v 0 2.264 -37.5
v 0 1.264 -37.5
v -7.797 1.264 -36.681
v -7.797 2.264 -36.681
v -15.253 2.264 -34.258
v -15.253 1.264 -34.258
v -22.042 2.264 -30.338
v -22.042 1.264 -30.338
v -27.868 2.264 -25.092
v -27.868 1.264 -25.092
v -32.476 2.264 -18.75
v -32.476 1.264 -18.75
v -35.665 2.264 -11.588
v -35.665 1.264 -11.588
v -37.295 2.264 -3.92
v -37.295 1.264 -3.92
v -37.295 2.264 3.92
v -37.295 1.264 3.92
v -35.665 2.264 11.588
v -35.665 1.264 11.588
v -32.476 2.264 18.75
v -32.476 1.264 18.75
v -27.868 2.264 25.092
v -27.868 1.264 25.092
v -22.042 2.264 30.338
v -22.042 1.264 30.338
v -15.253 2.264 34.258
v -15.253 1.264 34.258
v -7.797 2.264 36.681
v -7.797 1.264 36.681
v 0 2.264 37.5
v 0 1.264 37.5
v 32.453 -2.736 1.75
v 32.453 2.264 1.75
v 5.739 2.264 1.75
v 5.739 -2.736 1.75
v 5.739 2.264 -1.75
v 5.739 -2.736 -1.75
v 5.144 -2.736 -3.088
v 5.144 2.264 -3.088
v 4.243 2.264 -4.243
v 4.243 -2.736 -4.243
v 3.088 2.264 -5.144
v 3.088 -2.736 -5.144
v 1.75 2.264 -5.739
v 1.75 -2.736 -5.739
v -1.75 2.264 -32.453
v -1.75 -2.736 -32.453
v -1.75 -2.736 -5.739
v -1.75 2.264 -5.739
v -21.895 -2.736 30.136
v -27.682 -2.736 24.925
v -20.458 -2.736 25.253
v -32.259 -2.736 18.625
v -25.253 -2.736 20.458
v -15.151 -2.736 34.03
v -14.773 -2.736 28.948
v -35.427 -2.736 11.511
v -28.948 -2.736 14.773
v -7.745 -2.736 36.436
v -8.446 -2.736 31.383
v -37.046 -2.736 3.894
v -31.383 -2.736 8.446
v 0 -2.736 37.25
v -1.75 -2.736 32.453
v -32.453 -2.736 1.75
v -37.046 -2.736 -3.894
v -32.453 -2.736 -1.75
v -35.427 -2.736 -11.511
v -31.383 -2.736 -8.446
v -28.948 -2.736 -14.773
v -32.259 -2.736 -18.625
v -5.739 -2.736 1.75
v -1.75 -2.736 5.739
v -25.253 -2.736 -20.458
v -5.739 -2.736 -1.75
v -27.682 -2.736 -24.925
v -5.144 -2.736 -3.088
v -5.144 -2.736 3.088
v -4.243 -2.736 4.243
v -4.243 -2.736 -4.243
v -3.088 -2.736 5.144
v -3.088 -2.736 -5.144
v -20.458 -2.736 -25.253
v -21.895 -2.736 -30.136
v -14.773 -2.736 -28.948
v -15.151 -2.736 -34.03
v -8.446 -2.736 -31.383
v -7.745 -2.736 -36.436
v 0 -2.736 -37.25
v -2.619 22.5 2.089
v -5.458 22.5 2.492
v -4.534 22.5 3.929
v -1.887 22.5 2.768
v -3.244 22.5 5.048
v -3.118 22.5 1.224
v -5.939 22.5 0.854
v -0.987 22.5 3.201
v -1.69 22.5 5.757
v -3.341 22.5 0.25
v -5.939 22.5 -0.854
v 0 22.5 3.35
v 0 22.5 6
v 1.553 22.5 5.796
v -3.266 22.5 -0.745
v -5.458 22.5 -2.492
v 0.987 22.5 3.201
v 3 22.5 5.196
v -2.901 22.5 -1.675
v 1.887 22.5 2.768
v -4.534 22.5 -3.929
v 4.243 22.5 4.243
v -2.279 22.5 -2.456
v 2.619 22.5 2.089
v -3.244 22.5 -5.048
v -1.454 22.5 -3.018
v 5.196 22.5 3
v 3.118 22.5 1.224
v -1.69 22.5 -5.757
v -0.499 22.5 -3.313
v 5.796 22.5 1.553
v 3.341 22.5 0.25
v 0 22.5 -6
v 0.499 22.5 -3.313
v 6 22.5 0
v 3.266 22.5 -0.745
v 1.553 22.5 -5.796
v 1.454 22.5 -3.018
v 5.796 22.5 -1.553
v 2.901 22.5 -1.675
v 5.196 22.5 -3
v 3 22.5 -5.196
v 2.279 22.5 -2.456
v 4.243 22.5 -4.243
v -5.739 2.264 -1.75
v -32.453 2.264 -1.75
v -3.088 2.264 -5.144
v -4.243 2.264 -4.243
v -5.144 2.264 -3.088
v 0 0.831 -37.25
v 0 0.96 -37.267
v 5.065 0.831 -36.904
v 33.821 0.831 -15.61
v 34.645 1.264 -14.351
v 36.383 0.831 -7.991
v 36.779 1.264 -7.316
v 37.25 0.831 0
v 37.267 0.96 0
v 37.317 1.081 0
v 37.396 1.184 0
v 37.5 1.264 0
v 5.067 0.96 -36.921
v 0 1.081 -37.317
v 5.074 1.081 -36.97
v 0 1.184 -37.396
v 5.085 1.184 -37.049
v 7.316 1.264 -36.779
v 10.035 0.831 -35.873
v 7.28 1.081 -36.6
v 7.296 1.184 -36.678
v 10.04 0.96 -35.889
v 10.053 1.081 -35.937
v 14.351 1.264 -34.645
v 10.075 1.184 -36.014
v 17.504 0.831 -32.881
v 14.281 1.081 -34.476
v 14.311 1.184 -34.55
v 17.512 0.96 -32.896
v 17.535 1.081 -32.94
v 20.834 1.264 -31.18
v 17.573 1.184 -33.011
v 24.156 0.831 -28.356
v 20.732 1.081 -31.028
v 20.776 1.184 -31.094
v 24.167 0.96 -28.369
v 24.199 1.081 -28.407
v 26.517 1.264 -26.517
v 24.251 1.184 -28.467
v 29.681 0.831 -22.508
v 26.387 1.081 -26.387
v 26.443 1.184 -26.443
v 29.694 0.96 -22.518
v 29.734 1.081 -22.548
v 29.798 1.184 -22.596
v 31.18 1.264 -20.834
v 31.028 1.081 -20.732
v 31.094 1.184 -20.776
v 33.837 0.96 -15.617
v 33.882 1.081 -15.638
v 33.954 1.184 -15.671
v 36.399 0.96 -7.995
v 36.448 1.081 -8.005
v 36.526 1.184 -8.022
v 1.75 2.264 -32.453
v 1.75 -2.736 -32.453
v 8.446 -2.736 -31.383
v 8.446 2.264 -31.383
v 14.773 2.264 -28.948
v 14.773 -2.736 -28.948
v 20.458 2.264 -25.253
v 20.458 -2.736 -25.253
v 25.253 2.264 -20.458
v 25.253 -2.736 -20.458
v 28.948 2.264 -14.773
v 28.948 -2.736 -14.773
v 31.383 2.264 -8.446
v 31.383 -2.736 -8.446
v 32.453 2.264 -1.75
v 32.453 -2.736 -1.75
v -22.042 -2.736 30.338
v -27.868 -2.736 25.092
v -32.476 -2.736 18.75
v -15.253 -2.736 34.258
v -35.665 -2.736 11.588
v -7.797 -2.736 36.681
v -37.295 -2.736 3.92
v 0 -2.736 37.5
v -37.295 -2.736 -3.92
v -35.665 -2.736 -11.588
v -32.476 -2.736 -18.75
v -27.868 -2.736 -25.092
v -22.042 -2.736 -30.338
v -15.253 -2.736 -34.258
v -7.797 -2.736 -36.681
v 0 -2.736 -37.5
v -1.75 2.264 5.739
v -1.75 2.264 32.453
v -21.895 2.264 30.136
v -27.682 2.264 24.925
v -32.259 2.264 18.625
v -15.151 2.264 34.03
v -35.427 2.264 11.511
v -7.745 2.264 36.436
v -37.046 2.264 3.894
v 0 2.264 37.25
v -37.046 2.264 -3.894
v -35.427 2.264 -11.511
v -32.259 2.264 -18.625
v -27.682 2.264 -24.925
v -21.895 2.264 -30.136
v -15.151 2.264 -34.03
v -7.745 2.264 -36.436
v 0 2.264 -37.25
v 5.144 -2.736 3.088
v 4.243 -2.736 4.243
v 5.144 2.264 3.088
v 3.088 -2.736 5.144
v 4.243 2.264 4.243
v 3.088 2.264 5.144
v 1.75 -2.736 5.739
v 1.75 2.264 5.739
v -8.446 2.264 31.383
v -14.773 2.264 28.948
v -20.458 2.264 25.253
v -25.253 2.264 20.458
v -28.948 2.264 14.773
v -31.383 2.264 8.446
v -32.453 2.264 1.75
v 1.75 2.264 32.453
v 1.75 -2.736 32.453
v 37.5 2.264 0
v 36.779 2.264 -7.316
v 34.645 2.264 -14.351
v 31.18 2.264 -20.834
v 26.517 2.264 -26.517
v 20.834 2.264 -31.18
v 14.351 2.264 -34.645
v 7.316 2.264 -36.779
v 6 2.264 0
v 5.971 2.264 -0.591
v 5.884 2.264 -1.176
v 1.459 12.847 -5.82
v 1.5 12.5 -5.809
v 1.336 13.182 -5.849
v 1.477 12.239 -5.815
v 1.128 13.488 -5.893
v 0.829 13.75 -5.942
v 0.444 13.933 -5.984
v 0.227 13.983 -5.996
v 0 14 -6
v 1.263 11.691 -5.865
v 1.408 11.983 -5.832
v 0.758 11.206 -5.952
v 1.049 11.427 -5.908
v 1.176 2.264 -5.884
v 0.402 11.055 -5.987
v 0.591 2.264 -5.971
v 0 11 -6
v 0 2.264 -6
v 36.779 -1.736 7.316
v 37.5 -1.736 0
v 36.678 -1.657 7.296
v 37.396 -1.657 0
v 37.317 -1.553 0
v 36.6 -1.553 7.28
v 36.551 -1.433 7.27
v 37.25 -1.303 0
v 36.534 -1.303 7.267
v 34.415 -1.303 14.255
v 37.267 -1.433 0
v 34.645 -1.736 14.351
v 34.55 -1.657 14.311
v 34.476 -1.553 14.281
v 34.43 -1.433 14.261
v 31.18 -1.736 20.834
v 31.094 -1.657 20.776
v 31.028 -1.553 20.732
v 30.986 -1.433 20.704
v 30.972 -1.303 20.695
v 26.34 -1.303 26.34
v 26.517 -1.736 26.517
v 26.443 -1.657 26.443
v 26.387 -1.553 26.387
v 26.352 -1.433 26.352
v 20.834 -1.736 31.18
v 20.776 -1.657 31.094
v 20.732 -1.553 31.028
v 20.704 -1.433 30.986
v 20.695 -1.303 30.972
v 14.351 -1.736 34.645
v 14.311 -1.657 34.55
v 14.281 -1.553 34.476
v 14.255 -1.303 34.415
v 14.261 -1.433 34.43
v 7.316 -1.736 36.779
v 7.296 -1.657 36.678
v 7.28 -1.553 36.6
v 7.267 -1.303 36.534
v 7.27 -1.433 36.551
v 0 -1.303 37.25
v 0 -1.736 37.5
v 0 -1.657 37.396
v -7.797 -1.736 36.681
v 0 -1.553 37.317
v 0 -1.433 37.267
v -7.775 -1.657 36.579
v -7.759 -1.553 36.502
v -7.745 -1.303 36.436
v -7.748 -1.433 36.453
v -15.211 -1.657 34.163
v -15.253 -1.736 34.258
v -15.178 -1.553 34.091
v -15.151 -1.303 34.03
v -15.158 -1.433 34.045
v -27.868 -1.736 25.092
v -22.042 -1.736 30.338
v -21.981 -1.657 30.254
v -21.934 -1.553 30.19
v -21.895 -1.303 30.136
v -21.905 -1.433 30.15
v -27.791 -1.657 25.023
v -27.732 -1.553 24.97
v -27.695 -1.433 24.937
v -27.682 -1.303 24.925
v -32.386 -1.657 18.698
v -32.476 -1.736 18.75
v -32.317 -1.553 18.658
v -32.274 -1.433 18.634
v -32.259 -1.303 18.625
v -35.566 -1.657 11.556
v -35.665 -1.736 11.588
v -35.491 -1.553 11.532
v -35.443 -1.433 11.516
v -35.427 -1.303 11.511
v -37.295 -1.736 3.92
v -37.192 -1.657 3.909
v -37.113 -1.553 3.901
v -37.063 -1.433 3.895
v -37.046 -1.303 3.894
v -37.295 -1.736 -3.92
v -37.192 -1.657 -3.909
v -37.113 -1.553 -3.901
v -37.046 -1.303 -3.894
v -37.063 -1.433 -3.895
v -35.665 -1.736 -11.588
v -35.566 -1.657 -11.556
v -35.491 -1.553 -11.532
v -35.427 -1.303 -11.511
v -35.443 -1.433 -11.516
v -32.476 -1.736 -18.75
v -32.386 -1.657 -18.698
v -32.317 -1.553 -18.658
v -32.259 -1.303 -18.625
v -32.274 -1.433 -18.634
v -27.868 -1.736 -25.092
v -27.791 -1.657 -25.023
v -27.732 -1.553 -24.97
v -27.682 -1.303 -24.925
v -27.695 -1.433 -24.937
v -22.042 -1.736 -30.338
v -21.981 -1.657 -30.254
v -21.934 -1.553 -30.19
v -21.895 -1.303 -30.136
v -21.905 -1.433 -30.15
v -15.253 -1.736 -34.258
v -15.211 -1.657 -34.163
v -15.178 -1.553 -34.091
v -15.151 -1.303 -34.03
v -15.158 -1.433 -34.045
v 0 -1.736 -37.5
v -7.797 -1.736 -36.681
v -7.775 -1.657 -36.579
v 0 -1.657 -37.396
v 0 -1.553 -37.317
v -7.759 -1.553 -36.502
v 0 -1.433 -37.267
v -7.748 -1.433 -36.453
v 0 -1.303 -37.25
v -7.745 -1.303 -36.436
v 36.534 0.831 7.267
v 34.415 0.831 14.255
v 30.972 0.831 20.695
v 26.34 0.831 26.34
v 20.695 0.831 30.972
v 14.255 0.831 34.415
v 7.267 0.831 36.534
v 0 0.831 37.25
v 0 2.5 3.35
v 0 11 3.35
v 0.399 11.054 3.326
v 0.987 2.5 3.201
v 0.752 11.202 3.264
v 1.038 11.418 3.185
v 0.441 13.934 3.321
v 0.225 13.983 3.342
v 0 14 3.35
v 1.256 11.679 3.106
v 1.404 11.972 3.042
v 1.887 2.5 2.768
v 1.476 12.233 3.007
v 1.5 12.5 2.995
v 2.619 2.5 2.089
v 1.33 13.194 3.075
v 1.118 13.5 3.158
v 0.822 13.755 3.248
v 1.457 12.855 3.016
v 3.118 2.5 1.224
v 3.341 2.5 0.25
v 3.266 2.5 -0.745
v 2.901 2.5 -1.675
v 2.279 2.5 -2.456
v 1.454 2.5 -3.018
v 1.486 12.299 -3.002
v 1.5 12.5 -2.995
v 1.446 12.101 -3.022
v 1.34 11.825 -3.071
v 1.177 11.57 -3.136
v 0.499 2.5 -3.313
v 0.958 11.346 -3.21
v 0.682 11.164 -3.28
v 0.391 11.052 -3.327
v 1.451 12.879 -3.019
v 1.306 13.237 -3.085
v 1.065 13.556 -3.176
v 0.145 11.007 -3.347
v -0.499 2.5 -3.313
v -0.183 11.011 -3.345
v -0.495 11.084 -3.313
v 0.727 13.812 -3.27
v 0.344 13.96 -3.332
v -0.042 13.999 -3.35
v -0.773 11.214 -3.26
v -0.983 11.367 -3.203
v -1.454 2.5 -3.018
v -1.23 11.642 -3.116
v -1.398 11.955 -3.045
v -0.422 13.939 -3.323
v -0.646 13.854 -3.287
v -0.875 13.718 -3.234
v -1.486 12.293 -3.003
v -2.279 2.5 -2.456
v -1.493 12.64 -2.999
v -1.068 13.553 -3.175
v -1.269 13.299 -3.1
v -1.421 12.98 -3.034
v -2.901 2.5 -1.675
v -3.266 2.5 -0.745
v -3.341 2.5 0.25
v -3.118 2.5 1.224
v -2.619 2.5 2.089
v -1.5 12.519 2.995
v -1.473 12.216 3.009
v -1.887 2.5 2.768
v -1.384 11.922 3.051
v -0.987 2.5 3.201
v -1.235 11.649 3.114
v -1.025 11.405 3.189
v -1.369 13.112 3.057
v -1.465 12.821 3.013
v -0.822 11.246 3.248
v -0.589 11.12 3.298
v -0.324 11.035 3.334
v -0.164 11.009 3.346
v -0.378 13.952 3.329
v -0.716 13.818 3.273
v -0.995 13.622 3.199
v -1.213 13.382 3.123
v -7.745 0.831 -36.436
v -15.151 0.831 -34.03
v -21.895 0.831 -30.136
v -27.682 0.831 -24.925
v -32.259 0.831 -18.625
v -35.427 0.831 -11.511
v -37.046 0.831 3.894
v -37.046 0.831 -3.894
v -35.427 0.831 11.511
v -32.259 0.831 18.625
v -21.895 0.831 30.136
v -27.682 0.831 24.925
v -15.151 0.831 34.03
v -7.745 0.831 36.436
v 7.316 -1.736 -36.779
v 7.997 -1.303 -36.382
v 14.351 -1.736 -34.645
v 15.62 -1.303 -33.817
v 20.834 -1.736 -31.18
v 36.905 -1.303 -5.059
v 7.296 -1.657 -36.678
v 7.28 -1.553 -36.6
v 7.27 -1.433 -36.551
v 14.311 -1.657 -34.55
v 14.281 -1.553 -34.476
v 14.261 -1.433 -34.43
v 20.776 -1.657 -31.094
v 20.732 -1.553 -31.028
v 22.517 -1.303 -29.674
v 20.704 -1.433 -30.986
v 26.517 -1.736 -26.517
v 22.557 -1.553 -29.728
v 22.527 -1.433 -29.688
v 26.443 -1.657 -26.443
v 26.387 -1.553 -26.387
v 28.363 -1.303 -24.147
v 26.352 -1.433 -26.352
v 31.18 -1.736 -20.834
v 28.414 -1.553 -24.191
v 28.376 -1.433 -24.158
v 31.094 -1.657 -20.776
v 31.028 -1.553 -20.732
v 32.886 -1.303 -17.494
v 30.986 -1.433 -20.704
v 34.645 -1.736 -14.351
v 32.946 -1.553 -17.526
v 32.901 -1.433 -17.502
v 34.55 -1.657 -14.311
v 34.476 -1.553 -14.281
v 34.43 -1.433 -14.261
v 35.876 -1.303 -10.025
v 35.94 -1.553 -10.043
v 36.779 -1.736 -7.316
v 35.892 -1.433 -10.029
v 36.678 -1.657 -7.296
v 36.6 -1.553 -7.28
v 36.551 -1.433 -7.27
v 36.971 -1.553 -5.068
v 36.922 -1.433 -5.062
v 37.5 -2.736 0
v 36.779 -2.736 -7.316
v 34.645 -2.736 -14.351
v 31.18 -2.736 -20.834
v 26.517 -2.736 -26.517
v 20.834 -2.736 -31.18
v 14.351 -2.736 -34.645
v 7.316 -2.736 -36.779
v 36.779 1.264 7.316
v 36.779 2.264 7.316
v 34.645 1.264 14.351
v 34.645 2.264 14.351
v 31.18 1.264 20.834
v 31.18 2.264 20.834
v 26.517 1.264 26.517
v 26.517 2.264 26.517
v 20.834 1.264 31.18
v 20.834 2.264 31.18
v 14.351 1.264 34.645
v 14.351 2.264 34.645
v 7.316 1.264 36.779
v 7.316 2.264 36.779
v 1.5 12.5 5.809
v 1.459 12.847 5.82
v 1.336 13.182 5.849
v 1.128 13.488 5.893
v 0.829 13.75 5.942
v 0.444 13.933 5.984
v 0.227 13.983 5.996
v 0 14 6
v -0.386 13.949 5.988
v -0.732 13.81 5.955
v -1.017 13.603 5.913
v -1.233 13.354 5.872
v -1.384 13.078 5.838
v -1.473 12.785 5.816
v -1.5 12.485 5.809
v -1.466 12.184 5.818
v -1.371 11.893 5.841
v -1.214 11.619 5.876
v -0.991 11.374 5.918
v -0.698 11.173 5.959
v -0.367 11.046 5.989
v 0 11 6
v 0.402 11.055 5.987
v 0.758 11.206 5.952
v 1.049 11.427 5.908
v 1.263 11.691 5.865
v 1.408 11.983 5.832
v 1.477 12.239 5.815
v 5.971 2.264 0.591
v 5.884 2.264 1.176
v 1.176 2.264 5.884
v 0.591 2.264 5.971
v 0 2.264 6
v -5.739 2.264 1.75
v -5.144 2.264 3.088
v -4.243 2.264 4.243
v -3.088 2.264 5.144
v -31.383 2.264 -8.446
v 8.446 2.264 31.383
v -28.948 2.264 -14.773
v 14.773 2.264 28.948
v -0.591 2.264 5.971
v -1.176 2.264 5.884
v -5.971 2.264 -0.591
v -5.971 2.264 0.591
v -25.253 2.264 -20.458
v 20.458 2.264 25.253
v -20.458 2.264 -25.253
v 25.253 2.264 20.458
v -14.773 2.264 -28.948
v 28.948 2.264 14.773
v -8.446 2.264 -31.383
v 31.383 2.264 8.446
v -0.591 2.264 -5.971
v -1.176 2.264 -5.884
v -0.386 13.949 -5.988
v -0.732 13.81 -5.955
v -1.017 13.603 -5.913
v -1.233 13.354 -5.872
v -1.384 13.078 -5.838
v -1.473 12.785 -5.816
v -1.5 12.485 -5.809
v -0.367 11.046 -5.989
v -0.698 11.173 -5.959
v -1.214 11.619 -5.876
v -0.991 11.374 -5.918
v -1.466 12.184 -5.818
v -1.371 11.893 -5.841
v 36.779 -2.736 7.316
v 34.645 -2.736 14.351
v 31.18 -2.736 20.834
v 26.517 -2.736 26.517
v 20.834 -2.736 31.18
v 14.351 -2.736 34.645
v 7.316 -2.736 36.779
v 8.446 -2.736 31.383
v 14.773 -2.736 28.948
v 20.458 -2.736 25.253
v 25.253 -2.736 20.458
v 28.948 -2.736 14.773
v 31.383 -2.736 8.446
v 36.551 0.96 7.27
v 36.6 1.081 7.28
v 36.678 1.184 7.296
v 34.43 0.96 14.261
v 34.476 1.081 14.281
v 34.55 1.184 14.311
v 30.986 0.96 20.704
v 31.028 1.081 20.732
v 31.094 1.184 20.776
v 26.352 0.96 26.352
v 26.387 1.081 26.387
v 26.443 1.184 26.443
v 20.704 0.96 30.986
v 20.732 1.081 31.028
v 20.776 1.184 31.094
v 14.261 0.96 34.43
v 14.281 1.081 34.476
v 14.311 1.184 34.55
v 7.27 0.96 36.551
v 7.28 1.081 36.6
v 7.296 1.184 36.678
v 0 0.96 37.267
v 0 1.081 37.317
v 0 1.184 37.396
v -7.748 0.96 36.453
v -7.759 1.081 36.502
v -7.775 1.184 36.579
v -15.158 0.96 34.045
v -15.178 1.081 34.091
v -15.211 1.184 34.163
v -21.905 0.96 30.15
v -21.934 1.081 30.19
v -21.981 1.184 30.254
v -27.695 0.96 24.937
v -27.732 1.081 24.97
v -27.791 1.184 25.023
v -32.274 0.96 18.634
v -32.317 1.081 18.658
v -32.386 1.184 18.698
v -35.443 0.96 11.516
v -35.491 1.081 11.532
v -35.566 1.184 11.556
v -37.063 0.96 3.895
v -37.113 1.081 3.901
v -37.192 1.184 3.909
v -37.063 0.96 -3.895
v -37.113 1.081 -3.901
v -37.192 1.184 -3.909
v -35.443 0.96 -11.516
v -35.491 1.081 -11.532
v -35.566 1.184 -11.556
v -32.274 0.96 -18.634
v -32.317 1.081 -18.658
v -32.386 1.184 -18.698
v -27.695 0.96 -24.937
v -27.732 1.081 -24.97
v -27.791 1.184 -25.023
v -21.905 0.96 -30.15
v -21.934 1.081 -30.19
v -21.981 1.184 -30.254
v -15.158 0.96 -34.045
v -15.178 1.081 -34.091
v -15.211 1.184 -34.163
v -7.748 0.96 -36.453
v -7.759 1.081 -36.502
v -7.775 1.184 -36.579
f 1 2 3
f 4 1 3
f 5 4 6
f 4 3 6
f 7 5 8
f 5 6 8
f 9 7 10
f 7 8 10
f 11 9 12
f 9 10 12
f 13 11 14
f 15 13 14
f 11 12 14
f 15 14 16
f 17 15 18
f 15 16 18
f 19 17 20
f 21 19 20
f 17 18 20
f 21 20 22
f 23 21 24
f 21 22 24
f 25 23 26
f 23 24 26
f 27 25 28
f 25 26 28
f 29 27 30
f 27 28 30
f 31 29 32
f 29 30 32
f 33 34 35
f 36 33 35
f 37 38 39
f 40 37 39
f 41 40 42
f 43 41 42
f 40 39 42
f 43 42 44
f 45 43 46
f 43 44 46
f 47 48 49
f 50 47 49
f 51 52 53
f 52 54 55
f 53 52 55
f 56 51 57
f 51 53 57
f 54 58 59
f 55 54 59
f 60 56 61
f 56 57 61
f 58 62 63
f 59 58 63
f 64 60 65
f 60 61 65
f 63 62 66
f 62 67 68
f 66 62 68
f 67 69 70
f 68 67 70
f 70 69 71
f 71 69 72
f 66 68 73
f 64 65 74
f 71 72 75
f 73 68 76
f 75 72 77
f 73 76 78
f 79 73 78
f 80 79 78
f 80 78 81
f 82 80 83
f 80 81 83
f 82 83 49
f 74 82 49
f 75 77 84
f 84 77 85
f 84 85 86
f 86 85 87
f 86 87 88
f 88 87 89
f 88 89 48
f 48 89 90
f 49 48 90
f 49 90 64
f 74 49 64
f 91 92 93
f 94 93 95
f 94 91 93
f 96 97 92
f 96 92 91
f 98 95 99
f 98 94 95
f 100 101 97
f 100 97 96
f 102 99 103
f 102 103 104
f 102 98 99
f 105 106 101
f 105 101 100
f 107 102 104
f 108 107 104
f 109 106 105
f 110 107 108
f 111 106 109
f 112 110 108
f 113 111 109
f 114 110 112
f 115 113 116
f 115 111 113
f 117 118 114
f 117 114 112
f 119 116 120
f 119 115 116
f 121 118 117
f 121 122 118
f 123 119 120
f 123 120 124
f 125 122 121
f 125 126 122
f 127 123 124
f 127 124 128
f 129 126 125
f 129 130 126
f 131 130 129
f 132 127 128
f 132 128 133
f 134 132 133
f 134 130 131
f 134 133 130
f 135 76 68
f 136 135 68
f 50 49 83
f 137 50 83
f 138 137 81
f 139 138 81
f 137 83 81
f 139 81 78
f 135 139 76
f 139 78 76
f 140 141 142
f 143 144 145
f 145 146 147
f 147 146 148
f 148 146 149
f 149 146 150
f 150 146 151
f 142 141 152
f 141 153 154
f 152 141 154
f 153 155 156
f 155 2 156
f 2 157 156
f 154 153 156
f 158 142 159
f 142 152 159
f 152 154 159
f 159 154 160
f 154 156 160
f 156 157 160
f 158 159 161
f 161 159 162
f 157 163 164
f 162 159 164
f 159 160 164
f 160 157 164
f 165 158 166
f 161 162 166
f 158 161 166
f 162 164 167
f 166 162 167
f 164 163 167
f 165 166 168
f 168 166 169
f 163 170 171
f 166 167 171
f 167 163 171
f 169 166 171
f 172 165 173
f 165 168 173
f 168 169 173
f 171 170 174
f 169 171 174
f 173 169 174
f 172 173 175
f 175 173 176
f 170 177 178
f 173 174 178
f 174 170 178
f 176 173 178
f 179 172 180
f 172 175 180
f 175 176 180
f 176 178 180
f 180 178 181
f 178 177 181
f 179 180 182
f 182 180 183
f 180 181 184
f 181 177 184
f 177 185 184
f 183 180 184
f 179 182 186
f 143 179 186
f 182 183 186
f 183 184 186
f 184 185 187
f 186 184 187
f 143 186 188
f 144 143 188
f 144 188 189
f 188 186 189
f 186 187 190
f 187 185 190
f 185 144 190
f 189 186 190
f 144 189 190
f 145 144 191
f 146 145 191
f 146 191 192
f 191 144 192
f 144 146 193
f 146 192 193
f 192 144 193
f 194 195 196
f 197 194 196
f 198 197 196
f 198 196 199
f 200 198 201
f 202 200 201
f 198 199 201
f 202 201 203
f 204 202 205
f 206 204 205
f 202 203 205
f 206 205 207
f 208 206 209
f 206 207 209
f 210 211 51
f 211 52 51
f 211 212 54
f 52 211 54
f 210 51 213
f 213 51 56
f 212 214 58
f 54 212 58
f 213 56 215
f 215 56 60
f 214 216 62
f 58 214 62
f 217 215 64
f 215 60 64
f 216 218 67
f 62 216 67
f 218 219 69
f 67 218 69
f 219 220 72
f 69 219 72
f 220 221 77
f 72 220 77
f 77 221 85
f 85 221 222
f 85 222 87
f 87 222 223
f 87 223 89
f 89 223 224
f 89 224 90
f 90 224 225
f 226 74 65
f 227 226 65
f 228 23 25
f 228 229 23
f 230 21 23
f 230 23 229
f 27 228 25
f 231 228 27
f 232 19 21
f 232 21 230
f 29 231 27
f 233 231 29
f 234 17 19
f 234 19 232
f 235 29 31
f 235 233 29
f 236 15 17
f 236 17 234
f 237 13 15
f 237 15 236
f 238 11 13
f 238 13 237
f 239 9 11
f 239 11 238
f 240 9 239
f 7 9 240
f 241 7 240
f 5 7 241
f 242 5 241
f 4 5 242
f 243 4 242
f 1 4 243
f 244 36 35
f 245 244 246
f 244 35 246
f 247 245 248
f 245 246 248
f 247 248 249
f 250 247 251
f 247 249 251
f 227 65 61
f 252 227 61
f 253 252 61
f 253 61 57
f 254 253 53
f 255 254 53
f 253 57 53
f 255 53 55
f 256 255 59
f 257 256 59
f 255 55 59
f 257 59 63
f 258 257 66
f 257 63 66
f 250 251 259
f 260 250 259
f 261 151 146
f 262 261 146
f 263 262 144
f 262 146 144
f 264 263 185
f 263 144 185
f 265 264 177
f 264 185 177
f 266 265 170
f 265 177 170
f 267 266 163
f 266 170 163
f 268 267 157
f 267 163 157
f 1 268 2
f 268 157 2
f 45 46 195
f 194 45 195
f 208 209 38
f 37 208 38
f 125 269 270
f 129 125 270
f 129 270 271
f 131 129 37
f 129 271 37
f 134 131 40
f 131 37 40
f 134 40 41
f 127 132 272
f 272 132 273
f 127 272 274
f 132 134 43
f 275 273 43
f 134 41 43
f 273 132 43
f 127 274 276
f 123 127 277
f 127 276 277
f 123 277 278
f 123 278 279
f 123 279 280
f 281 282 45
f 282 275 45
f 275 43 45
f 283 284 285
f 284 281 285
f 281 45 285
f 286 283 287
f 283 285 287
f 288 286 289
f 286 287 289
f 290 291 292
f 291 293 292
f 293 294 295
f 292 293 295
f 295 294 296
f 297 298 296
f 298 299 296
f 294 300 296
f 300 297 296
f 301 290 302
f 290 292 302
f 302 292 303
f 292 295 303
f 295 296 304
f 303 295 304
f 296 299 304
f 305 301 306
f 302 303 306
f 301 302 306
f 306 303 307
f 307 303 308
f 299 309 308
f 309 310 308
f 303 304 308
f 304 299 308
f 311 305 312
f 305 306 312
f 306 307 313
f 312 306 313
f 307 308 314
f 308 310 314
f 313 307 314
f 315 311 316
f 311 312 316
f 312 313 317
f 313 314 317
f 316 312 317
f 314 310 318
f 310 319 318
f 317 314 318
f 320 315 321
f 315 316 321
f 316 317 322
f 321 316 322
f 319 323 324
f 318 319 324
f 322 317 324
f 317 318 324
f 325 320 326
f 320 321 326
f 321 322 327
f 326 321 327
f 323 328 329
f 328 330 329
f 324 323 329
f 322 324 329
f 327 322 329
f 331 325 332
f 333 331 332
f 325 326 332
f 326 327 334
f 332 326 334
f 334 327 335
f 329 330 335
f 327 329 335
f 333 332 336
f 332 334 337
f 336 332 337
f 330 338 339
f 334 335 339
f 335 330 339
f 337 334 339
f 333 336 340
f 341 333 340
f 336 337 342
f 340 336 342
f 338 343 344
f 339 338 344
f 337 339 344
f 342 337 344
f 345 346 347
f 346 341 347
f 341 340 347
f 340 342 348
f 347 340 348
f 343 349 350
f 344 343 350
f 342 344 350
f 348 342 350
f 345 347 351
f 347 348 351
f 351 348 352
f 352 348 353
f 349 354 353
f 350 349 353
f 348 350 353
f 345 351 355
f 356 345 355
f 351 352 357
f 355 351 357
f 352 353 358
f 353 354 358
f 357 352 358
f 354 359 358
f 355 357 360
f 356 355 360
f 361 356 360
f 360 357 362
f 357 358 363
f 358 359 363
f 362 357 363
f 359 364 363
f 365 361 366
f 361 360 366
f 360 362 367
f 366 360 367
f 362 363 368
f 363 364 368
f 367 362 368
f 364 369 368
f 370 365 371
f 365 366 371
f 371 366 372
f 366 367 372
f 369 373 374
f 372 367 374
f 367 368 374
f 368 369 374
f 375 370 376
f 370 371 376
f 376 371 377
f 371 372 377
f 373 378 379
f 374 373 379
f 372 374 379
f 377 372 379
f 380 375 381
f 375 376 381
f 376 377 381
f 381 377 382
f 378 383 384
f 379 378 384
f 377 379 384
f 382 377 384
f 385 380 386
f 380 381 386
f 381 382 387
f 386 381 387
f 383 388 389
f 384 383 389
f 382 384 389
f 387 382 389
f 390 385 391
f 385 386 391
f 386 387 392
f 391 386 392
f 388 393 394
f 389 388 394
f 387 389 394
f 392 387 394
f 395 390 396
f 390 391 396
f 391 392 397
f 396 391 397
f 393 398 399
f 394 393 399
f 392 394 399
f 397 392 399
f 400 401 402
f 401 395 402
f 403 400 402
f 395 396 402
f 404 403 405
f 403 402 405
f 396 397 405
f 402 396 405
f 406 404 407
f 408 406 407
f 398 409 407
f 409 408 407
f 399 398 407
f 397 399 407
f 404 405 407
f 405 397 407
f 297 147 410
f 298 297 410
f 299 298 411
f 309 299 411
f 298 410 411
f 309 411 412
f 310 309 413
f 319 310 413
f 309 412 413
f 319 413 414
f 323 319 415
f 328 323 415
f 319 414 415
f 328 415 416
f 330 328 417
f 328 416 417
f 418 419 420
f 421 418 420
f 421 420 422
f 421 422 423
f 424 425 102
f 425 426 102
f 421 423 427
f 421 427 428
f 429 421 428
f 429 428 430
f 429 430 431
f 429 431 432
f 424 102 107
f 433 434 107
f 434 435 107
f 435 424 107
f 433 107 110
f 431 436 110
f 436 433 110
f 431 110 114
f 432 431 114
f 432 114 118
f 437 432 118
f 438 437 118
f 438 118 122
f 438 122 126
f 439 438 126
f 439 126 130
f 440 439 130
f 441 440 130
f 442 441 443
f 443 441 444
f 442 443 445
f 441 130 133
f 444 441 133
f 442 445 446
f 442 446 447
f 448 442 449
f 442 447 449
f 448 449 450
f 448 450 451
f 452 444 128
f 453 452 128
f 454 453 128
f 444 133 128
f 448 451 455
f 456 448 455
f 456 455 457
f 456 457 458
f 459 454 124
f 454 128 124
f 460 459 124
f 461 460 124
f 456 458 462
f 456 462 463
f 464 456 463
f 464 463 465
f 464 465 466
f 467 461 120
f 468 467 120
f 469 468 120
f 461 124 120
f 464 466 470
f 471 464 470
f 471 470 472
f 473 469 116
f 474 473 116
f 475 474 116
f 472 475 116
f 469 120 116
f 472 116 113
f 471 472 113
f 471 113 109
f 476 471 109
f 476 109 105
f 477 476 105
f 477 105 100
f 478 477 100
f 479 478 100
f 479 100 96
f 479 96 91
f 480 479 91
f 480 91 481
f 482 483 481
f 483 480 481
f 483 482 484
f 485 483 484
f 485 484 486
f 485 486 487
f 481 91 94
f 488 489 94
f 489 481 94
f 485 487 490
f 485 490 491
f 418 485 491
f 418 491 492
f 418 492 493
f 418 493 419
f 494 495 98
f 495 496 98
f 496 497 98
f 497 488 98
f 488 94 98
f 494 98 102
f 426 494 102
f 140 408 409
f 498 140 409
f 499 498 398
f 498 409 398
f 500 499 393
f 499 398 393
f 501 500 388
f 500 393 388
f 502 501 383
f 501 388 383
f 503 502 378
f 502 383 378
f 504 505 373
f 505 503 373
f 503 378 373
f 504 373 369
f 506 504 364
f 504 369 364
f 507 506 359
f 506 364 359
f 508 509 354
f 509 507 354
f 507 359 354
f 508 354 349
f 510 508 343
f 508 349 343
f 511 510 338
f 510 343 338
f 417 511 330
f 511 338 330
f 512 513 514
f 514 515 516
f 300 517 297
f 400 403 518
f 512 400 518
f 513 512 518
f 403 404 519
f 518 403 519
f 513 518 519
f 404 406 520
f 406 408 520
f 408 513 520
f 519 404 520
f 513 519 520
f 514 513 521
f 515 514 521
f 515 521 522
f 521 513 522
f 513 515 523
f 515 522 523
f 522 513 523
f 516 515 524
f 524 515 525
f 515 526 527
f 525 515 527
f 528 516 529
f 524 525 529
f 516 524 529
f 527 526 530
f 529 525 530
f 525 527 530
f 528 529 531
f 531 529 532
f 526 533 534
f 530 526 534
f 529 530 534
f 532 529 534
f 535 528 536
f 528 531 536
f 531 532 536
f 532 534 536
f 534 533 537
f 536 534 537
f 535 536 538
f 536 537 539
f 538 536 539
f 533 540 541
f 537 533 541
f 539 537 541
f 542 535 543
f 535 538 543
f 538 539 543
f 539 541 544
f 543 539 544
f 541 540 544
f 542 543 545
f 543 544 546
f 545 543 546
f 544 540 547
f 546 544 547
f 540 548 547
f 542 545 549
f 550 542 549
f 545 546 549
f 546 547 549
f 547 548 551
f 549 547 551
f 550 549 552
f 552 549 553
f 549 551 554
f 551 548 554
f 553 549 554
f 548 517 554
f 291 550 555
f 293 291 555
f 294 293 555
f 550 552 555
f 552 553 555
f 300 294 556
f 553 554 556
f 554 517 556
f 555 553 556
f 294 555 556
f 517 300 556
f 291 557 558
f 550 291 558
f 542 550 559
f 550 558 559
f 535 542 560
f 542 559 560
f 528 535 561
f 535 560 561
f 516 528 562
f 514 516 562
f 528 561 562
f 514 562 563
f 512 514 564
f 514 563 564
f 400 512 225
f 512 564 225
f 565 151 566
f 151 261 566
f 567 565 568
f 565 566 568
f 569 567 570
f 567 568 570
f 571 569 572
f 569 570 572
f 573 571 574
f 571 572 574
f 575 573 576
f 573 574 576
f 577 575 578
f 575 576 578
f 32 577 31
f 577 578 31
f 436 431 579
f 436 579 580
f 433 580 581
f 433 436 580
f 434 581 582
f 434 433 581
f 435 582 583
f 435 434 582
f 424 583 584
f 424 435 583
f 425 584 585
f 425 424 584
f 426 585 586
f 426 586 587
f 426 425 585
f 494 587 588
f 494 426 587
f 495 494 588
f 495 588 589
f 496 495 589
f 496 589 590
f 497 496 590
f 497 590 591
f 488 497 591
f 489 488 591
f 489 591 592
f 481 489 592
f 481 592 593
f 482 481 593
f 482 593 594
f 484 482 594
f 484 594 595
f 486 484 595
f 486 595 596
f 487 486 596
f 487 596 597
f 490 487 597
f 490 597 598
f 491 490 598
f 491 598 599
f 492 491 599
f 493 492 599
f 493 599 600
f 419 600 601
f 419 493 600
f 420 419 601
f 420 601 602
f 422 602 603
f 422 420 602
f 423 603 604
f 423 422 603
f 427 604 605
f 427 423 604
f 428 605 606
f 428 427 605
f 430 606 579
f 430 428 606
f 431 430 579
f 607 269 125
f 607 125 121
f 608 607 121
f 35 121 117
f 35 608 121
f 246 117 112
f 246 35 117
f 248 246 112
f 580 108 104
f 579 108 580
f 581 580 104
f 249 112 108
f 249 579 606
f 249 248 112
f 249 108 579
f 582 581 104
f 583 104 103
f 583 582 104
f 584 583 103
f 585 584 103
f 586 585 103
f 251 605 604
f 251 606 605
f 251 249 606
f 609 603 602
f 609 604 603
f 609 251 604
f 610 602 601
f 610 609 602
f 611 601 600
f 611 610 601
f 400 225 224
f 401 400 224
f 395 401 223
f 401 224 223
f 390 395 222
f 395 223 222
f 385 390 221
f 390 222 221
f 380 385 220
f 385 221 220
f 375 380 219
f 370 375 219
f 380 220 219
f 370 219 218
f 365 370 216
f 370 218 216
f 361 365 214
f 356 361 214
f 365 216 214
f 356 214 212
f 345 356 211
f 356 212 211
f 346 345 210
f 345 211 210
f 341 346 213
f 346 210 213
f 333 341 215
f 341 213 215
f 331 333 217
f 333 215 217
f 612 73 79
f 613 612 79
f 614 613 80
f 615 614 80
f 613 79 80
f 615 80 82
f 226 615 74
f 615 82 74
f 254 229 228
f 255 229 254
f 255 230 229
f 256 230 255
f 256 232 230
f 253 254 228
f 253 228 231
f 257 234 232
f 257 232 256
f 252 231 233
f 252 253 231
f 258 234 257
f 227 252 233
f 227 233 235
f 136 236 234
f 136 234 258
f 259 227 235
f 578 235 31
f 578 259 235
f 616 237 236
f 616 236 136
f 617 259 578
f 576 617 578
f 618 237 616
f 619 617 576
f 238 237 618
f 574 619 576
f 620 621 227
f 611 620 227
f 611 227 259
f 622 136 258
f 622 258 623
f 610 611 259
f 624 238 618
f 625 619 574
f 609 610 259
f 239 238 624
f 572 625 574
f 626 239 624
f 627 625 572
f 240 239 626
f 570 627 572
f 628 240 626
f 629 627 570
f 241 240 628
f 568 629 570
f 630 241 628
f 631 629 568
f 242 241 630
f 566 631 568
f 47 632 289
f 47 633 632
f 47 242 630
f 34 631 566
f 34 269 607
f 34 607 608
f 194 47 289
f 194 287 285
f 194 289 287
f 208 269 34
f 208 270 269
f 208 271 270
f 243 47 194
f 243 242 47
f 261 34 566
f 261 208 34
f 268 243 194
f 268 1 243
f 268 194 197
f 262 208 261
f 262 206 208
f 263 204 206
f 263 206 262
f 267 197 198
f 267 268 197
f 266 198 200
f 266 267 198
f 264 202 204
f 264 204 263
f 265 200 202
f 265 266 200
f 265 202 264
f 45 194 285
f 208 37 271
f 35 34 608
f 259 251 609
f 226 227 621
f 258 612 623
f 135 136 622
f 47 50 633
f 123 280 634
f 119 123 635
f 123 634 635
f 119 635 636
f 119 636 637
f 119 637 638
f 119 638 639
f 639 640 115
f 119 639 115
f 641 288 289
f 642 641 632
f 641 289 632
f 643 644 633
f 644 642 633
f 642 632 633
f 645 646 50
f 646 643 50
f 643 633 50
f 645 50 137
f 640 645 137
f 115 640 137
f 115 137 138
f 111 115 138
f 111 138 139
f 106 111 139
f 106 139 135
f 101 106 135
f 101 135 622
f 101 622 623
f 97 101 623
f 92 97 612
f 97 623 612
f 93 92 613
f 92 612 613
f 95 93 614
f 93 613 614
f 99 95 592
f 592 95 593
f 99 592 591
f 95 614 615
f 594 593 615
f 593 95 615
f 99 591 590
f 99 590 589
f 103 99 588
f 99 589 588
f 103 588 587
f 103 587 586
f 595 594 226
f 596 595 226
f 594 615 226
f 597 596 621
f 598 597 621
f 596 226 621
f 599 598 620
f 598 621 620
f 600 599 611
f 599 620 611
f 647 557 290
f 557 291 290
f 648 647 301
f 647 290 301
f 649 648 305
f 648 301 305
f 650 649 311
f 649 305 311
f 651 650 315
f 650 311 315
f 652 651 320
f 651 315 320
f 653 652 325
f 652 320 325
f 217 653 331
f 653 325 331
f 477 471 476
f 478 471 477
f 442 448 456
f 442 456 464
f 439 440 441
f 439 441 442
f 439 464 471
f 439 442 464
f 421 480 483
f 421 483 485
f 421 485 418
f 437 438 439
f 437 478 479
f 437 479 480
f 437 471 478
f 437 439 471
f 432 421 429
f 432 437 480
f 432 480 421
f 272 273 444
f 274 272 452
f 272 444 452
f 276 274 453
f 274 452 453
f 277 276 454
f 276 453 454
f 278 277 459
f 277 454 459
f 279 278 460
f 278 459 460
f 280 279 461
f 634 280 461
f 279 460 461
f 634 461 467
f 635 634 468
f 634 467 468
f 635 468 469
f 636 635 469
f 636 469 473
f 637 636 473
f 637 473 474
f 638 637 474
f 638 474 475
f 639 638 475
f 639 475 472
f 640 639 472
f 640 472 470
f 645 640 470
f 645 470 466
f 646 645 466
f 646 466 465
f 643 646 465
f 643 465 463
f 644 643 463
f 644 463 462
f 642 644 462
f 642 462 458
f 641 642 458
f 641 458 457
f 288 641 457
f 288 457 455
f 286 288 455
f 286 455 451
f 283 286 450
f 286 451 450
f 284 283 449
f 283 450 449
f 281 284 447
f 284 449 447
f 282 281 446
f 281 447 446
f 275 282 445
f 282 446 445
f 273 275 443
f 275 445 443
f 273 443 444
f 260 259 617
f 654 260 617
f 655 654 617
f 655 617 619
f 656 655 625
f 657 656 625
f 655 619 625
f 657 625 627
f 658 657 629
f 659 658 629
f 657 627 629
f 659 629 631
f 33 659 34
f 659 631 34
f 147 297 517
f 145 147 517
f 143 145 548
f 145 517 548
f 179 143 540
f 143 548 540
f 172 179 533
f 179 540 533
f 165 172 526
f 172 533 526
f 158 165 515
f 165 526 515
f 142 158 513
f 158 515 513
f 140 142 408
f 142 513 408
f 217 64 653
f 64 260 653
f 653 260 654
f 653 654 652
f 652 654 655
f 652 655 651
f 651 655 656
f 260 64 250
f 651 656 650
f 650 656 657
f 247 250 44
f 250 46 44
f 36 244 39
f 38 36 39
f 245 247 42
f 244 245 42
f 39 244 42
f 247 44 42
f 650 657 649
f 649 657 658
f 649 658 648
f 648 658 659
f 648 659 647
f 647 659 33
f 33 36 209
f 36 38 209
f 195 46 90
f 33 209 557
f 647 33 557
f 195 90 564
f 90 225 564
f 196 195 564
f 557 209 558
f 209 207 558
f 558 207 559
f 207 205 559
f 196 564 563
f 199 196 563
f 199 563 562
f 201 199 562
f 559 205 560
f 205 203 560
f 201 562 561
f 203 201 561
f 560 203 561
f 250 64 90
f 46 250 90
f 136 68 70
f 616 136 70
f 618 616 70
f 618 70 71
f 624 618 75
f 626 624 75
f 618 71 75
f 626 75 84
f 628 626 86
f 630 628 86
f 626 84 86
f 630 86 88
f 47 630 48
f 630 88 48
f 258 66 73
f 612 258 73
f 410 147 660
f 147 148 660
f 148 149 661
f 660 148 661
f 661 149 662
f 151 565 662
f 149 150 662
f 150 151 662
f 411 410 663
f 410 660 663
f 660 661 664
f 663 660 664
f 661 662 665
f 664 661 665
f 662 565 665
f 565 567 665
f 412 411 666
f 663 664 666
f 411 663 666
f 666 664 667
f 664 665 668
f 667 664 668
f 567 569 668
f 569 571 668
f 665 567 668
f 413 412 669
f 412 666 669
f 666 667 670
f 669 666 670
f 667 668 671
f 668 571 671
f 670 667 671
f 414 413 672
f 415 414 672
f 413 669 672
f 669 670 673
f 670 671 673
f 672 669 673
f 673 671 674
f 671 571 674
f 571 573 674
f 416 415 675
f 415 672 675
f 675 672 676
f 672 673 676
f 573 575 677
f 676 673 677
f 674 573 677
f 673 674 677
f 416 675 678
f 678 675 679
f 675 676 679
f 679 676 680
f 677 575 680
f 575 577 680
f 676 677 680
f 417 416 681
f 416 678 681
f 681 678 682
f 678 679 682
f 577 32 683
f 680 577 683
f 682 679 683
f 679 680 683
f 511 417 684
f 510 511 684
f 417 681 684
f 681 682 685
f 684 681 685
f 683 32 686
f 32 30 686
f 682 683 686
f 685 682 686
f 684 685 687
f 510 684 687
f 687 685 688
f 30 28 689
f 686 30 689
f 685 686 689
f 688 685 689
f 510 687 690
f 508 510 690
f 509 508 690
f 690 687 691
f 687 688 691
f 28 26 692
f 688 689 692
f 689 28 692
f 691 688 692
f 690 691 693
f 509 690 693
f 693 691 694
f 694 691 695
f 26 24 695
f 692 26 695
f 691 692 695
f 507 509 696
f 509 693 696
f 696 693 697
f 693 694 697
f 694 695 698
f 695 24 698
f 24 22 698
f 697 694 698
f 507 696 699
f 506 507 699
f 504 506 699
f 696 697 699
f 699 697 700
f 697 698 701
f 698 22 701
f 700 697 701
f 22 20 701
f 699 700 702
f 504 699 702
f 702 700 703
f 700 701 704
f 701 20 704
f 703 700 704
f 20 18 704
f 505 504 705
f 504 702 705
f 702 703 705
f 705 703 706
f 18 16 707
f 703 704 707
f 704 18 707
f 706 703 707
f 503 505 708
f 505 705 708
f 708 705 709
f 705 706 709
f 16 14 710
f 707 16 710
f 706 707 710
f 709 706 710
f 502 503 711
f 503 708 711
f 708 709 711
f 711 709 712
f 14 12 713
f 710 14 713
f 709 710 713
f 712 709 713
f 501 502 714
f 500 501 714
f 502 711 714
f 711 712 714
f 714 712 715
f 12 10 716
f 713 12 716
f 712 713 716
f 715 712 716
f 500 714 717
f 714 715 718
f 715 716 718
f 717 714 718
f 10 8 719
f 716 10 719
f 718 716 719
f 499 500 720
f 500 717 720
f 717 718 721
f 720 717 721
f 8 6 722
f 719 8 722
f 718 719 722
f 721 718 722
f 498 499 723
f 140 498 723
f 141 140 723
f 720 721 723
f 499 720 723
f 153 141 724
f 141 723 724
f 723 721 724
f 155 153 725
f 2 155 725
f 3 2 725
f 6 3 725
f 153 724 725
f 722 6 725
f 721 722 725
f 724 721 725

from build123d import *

# Parameters (mm, degrees)
REVOLVE1_ANGLE                 = 90
BOSS_EXTRUDE2_DEPTH            = 22.5
CUT_EXTRUDE1_DEPTH             = 57.762672959
MIRROR3_START                  = -2.736132077
MIRROR3_DEPTH                  = 5
MIRROR3_START_2                = 2.263867923
MIRROR3_2_DEPTH                = 20.236132077
MIRROR3_3_DEPTH                = 1
MIRROR3_START_3                = 1.263867923
MIRROR3_4_DEPTH                = 1
MIRROR4_START                  = -2.736132077
MIRROR4_DEPTH                  = 5
MIRROR4_START_2                = 2.263867923
MIRROR4_2_DEPTH                = 20.236132077
MIRROR4_3_DEPTH                = 1
MIRROR4_START_3                = 1.263867923
MIRROR4_4_DEPTH                = 1
SKETCH7_R                      = 3.35
CUT_EXTRUDE2_DEPTH             = 20
FILLET9_R                      = 0.5
CUT_EXTRUDE3_REACH             = 59.609
SKETCH8_R                      = 1.5
CUT_EXTRUDE3_DIRECTION_2_REACH = 59.609


# Read off the part's stored shape, not the designer's step: Mirror3, Mirror4
with BuildPart() as part:
    # Sketch1 → Revolve1 (revolve)
    with BuildSketch(Plane.XY):
        Polygon((0, 2.263867923), (0, -2.736132077), (37.5, -2.736132077), (37.5, -1.736132077), (37.25, -1.736132077), (37.25, 1.263867923), (37.5, 1.263867923), (37.5, 2.263867923), align=None)
    revolve(axis=Axis((0, 2.263867923, 0), (0, -1, 0)), revolution_arc=REVOLVE1_ANGLE)

    # Sketch2 → Boss-Extrude2 (add)
    with BuildSketch(Plane(origin=(0, 0, 0), x_dir=(1, 0, 0), z_dir=(0, 1, 0))):
        with BuildLine():
            Line((0, 0), (6, 0))
            ThreePointArc((6, 0), (4.242640687, -4.242640687), (0, -6))
            Line((0, -6), (0, 0))
        make_face()
    extrude(amount=BOSS_EXTRUDE2_DEPTH)

    # Sketch6 → Cut-Extrude1 (cut, through all)
    with BuildSketch(Plane(origin=(0, 2.263867923, 0), x_dir=(1, 0, 0), z_dir=(0, 1, 0))):
        with BuildLine():
            Line((1.75, -5.739120142), (1.75, -32.452850414))
            ThreePointArc((1.75, -32.452850414), (22.980970389, -22.980970389), (32.452850414, -1.75))
            Line((32.452850414, -1.75), (5.739120142, -1.75))
            ThreePointArc((5.739120142, -1.75), (4.242640687, -4.242640687), (1.75, -5.739120142))
        make_face()
    extrude(amount=-CUT_EXTRUDE1_DEPTH, mode=Mode.SUBTRACT)

    # Mirror3 outline → Mirror3 (add)
    with BuildSketch(Plane(origin=(0, 0, 0), x_dir=(1, 0, 0), z_dir=(0, 1, 0)).offset(MIRROR3_START)):
        with BuildLine():
            ThreePointArc((37.25, 0), (26.339727599, 26.339727599), (0, 37.25))
            Line((0, 37.25), (0, 0))
            Line((0, 0), (37.25, 0))
        make_face()
        with BuildLine():
            Line((32.452850414, 1.75), (5.739120142, 1.75))
            ThreePointArc((5.739120142, 1.75), (4.242640687, 4.242640687), (1.75, 5.739120142))
            Line((1.75, 5.739120142), (1.75, 32.452850414))
            ThreePointArc((1.75, 32.452850414), (22.980970389, 22.980970389), (32.452850414, 1.75))
        make_face(mode=Mode.SUBTRACT)
    extrude(amount=MIRROR3_DEPTH)

    # Mirror3 2 outline → Mirror3 2 (add)
    with BuildSketch(Plane(origin=(0, 0, 0), x_dir=(1, 0, 0), z_dir=(0, 1, 0)).offset(MIRROR3_START_2)):
        with BuildLine():
            Line((0, 0), (6, 0))
            ThreePointArc((6, 0), (4.242640687, 4.242640687), (0, 6))
            Line((0, 6), (0, 0))
        make_face()
    extrude(amount=MIRROR3_2_DEPTH)

    # Mirror3 3 outline → Mirror3 3 (add)
    with BuildSketch(Plane(origin=(0, 0, 0), x_dir=(1, 0, 0), z_dir=(0, 1, 0)).offset(MIRROR3_START)):
        with BuildLine():
            Line((37.25, 0), (37.5, 0))
            ThreePointArc((37.5, 0), (26.516504294, 26.516504294), (0, 37.5))
            Line((0, 37.5), (0, 37.25))
            ThreePointArc((0, 37.25), (26.339727599, 26.339727599), (37.25, 0))
        make_face()
    extrude(amount=MIRROR3_3_DEPTH)

    # Mirror3 4 outline → Mirror3 4 (add)
    with BuildSketch(Plane(origin=(0, 0, 0), x_dir=(1, 0, 0), z_dir=(0, 1, 0)).offset(MIRROR3_START_3)):
        with BuildLine():
            Line((37.25, 0), (37.5, 0))
            ThreePointArc((37.5, 0), (26.516504294, 26.516504294), (0, 37.5))
            Line((0, 37.5), (0, 37.25))
            ThreePointArc((0, 37.25), (26.339727599, 26.339727599), (37.25, 0))
        make_face()
    extrude(amount=MIRROR3_4_DEPTH)

    # Mirror4 outline → Mirror4 (add)
    with BuildSketch(Plane(origin=(0, 0, 0), x_dir=(1, 0, 0), z_dir=(0, 1, 0)).offset(MIRROR4_START)):
        with BuildLine():
            ThreePointArc((0, 37.25), (-37.25, 0), (0, -37.25))
            Line((0, -37.25), (0, 37.25))
        make_face()
        with BuildLine():
            Line((-1.75, 32.452850414), (-1.75, 5.739120142))
            ThreePointArc((-1.75, 5.739120142), (-4.242640687, 4.242640687), (-5.739120142, 1.75))
            Line((-5.739120142, 1.75), (-32.452850414, 1.75))
            ThreePointArc((-32.452850414, 1.75), (-22.980970389, 22.980970389), (-1.75, 32.452850414))
        make_face(mode=Mode.SUBTRACT)
        with BuildLine():
            Line((-32.452850414, -1.75), (-5.739120142, -1.75))
            ThreePointArc((-5.739120142, -1.75), (-4.242640687, -4.242640687), (-1.75, -5.739120142))
            Line((-1.75, -5.739120142), (-1.75, -32.452850414))
            ThreePointArc((-1.75, -32.452850414), (-22.980970389, -22.980970389), (-32.452850414, -1.75))
        make_face(mode=Mode.SUBTRACT)
    extrude(amount=MIRROR4_DEPTH)

    # Mirror4 2 outline → Mirror4 2 (add)
    with BuildSketch(Plane(origin=(0, 0, 0), x_dir=(1, 0, 0), z_dir=(0, 1, 0)).offset(MIRROR4_START_2)):
        with BuildLine():
            Line((0, -6), (0, 6))
            ThreePointArc((0, 6), (-6, 0), (0, -6))
        make_face()
    extrude(amount=MIRROR4_2_DEPTH)

    # Mirror4 3 outline → Mirror4 3 (add)
    with BuildSketch(Plane(origin=(0, 0, 0), x_dir=(1, 0, 0), z_dir=(0, 1, 0)).offset(MIRROR4_START)):
        with BuildLine():
            Line((0, 37.25), (0, 37.5))
            ThreePointArc((0, 37.5), (-37.5, 0), (0, -37.5))
            Line((0, -37.5), (0, -37.25))
            ThreePointArc((0, -37.25), (-37.25, 0), (0, 37.25))
        make_face()
    extrude(amount=MIRROR4_3_DEPTH)

    # Mirror4 4 outline → Mirror4 4 (add)
    with BuildSketch(Plane(origin=(0, 0, 0), x_dir=(1, 0, 0), z_dir=(0, 1, 0)).offset(MIRROR4_START_3)):
        with BuildLine():
            Line((0, 37.25), (0, 37.5))
            ThreePointArc((0, 37.5), (-37.5, 0), (0, -37.5))
            Line((0, -37.5), (0, -37.25))
            ThreePointArc((0, -37.25), (-37.25, 0), (0, 37.25))
        make_face()
    extrude(amount=MIRROR4_4_DEPTH)

    # Sketch7 → Cut-Extrude2 (cut)
    with BuildSketch(Plane(origin=(0, 22.5, 0), x_dir=(1, 0, 0), z_dir=(0, 1, 0))):
        with Locations(Location((0, 0, 0), (0, 0, 270))):
            Circle(SKETCH7_R)
    extrude(amount=-CUT_EXTRUDE2_DEPTH, mode=Mode.SUBTRACT)

    # Fillet9
    # the kernel refuses this fillet: 0.5 mm, written as the material it adds along each edge
    with BuildSketch(Plane(origin=(0, 1.263867923, 0), x_dir=(0, 0, 1), z_dir=(1, 0, 0))) as fillet9_piece_1:
        with BuildLine():
            CenterArc((37.75, 0.433012702), FILLET9_R, 180, 60)
            Line((37.5, 0), (37.495, -0.008660254))
            ThreePointArc((37.495, -0.008660254), (37.375, -0.01), (37.25, -0.01))
            Line((37.25, -0.01), (37.24, 0))
            Line((37.24, 0), (37.24, 0.433012702))
            Line((37.24, 0.433012702), (37.25, 0.433012702))
        make_face()
    revolve(axis=Axis((0, 1.263867923, 0), (0, -1, 0)), revolution_arc=180)
    with BuildSketch(Plane(origin=(0, -1.736132077, 0), x_dir=(0, 0, 1), z_dir=(1, 0, 0))) as fillet9_piece_2:
        with BuildLine():
            CenterArc((37.75, -0.433012702), FILLET9_R, 120, 60)
            Line((37.25, -0.433012702), (37.24, -0.433012702))
            Line((37.24, -0.433012702), (37.24, 0))
            Line((37.24, 0), (37.25, 0.01))
            ThreePointArc((37.25, 0.01), (37.375, 0.01), (37.495, 0.008660254))
            Line((37.495, 0.008660254), (37.5, 0))
        make_face()
    revolve(axis=Axis((0, -1.736132077, 0), (0, -1, 0)), revolution_arc=180)
    with BuildSketch(Plane(origin=(0, -1.736132077, 0), x_dir=(1, 0, 0), z_dir=(0, 0, -1))) as fillet9_piece_3:
        with BuildLine():
            CenterArc((37.75, -0.433012702), FILLET9_R, 120, 60)
            Line((37.25, -0.433012702), (37.24, -0.433012702))
            Line((37.24, -0.433012702), (37.24, 0))
            Line((37.24, 0), (37.25, 0.01))
            ThreePointArc((37.25, 0.01), (37.375, 0.01), (37.495, 0.008660254))
            Line((37.495, 0.008660254), (37.5, 0))
        make_face()
    revolve(axis=Axis((0, -1.736132077, 0), (0, -1, 0)), revolution_arc=90)
    with BuildSketch(Plane(origin=(-1e-09, -1.736132077, 1e-09), x_dir=(1.823040450855093e-11, 0, -1.0), z_dir=(-1.0, 0, -1.823040450855093e-11))) as fillet9_piece_4:
        with BuildLine():
            CenterArc((37.750000001, -0.433012702), FILLET9_R, 120, 60)
            Line((37.250000001, -0.433012702), (37.240000001, -0.433012702))
            Line((37.240000001, -0.433012702), (37.240000001, 0))
            Line((37.240000001, 0), (37.250000001, 0.01))
            ThreePointArc((37.250000001, 0.01), (37.375000001, 0.01), (37.495000001, 0.008660254))
            Line((37.495000001, 0.008660254), (37.500000001, 0))
        make_face()
    revolve(axis=Axis((-1e-09, -1.736132077, 1e-09), (0, -1, 0)), revolution_arc=89.999999998)
    with BuildSketch(Plane(origin=(0, 1.263867923, 0), x_dir=(1, 0, 0), z_dir=(0, 0, -1))) as fillet9_piece_5:
        with BuildLine():
            CenterArc((37.75, 0.433012702), FILLET9_R, 180, 60)
            Line((37.5, 0), (37.495, -0.008660254))
            ThreePointArc((37.495, -0.008660254), (37.375, -0.01), (37.25, -0.01))
            Line((37.25, -0.01), (37.24, 0))
            Line((37.24, 0), (37.24, 0.433012702))
            Line((37.24, 0.433012702), (37.25, 0.433012702))
        make_face()
    revolve(axis=Axis((0, 1.263867923, 0), (0, -1, 0)), revolution_arc=90)
    with BuildSketch(Plane(origin=(-1e-09, 1.263867923, 1e-09), x_dir=(1.823040450855093e-11, 0, -1.0), z_dir=(-1.0, 0, -1.823040450855093e-11))) as fillet9_piece_6:
        with BuildLine():
            CenterArc((37.750000001, 0.433012702), FILLET9_R, 180, 60)
            Line((37.500000001, 0), (37.495000001, -0.008660254))
            ThreePointArc((37.495000001, -0.008660254), (37.375000001, -0.01), (37.250000001, -0.01))
            Line((37.250000001, -0.01), (37.240000001, 0))
            Line((37.240000001, 0), (37.240000001, 0.433012702))
            Line((37.240000001, 0.433012702), (37.250000001, 0.433012702))
        make_face()
    revolve(axis=Axis((-1e-09, 1.263867923, 1e-09), (0, -1, 0)), revolution_arc=89.999999998)

    # Sketch8 → Cut-Extrude3 (cut, up to next)
    with BuildSketch(Plane.XY, mode=Mode.PRIVATE) as cut_extrude3_sk1:
        with Locations((0, 12.5)):
            Circle(SKETCH8_R)
    cut_extrude3_tool1 = extrude(cut_extrude3_sk1.sketch, amount=-CUT_EXTRUDE3_REACH, mode=Mode.PRIVATE) & part.part
    add(cut_extrude3_tool1.solids().sort_by_distance((0, 12.5, 0))[0], mode=Mode.SUBTRACT)

    # Sketch8 → Cut-Extrude3 direction 2 (cut, up to next)
    with BuildSketch(Plane.XY, mode=Mode.PRIVATE) as cut_extrude3_direction_2_sk1:
        with Locations((0, 12.5)):
            Circle(SKETCH8_R)
    cut_extrude3_direction_2_tool1 = extrude(cut_extrude3_direction_2_sk1.sketch, amount=CUT_EXTRUDE3_DIRECTION_2_REACH, mode=Mode.PRIVATE) & part.part
    add(cut_extrude3_direction_2_tool1.solids().sort_by_distance((0, 12.5, 0))[0], mode=Mode.SUBTRACT)


solid = part.part
